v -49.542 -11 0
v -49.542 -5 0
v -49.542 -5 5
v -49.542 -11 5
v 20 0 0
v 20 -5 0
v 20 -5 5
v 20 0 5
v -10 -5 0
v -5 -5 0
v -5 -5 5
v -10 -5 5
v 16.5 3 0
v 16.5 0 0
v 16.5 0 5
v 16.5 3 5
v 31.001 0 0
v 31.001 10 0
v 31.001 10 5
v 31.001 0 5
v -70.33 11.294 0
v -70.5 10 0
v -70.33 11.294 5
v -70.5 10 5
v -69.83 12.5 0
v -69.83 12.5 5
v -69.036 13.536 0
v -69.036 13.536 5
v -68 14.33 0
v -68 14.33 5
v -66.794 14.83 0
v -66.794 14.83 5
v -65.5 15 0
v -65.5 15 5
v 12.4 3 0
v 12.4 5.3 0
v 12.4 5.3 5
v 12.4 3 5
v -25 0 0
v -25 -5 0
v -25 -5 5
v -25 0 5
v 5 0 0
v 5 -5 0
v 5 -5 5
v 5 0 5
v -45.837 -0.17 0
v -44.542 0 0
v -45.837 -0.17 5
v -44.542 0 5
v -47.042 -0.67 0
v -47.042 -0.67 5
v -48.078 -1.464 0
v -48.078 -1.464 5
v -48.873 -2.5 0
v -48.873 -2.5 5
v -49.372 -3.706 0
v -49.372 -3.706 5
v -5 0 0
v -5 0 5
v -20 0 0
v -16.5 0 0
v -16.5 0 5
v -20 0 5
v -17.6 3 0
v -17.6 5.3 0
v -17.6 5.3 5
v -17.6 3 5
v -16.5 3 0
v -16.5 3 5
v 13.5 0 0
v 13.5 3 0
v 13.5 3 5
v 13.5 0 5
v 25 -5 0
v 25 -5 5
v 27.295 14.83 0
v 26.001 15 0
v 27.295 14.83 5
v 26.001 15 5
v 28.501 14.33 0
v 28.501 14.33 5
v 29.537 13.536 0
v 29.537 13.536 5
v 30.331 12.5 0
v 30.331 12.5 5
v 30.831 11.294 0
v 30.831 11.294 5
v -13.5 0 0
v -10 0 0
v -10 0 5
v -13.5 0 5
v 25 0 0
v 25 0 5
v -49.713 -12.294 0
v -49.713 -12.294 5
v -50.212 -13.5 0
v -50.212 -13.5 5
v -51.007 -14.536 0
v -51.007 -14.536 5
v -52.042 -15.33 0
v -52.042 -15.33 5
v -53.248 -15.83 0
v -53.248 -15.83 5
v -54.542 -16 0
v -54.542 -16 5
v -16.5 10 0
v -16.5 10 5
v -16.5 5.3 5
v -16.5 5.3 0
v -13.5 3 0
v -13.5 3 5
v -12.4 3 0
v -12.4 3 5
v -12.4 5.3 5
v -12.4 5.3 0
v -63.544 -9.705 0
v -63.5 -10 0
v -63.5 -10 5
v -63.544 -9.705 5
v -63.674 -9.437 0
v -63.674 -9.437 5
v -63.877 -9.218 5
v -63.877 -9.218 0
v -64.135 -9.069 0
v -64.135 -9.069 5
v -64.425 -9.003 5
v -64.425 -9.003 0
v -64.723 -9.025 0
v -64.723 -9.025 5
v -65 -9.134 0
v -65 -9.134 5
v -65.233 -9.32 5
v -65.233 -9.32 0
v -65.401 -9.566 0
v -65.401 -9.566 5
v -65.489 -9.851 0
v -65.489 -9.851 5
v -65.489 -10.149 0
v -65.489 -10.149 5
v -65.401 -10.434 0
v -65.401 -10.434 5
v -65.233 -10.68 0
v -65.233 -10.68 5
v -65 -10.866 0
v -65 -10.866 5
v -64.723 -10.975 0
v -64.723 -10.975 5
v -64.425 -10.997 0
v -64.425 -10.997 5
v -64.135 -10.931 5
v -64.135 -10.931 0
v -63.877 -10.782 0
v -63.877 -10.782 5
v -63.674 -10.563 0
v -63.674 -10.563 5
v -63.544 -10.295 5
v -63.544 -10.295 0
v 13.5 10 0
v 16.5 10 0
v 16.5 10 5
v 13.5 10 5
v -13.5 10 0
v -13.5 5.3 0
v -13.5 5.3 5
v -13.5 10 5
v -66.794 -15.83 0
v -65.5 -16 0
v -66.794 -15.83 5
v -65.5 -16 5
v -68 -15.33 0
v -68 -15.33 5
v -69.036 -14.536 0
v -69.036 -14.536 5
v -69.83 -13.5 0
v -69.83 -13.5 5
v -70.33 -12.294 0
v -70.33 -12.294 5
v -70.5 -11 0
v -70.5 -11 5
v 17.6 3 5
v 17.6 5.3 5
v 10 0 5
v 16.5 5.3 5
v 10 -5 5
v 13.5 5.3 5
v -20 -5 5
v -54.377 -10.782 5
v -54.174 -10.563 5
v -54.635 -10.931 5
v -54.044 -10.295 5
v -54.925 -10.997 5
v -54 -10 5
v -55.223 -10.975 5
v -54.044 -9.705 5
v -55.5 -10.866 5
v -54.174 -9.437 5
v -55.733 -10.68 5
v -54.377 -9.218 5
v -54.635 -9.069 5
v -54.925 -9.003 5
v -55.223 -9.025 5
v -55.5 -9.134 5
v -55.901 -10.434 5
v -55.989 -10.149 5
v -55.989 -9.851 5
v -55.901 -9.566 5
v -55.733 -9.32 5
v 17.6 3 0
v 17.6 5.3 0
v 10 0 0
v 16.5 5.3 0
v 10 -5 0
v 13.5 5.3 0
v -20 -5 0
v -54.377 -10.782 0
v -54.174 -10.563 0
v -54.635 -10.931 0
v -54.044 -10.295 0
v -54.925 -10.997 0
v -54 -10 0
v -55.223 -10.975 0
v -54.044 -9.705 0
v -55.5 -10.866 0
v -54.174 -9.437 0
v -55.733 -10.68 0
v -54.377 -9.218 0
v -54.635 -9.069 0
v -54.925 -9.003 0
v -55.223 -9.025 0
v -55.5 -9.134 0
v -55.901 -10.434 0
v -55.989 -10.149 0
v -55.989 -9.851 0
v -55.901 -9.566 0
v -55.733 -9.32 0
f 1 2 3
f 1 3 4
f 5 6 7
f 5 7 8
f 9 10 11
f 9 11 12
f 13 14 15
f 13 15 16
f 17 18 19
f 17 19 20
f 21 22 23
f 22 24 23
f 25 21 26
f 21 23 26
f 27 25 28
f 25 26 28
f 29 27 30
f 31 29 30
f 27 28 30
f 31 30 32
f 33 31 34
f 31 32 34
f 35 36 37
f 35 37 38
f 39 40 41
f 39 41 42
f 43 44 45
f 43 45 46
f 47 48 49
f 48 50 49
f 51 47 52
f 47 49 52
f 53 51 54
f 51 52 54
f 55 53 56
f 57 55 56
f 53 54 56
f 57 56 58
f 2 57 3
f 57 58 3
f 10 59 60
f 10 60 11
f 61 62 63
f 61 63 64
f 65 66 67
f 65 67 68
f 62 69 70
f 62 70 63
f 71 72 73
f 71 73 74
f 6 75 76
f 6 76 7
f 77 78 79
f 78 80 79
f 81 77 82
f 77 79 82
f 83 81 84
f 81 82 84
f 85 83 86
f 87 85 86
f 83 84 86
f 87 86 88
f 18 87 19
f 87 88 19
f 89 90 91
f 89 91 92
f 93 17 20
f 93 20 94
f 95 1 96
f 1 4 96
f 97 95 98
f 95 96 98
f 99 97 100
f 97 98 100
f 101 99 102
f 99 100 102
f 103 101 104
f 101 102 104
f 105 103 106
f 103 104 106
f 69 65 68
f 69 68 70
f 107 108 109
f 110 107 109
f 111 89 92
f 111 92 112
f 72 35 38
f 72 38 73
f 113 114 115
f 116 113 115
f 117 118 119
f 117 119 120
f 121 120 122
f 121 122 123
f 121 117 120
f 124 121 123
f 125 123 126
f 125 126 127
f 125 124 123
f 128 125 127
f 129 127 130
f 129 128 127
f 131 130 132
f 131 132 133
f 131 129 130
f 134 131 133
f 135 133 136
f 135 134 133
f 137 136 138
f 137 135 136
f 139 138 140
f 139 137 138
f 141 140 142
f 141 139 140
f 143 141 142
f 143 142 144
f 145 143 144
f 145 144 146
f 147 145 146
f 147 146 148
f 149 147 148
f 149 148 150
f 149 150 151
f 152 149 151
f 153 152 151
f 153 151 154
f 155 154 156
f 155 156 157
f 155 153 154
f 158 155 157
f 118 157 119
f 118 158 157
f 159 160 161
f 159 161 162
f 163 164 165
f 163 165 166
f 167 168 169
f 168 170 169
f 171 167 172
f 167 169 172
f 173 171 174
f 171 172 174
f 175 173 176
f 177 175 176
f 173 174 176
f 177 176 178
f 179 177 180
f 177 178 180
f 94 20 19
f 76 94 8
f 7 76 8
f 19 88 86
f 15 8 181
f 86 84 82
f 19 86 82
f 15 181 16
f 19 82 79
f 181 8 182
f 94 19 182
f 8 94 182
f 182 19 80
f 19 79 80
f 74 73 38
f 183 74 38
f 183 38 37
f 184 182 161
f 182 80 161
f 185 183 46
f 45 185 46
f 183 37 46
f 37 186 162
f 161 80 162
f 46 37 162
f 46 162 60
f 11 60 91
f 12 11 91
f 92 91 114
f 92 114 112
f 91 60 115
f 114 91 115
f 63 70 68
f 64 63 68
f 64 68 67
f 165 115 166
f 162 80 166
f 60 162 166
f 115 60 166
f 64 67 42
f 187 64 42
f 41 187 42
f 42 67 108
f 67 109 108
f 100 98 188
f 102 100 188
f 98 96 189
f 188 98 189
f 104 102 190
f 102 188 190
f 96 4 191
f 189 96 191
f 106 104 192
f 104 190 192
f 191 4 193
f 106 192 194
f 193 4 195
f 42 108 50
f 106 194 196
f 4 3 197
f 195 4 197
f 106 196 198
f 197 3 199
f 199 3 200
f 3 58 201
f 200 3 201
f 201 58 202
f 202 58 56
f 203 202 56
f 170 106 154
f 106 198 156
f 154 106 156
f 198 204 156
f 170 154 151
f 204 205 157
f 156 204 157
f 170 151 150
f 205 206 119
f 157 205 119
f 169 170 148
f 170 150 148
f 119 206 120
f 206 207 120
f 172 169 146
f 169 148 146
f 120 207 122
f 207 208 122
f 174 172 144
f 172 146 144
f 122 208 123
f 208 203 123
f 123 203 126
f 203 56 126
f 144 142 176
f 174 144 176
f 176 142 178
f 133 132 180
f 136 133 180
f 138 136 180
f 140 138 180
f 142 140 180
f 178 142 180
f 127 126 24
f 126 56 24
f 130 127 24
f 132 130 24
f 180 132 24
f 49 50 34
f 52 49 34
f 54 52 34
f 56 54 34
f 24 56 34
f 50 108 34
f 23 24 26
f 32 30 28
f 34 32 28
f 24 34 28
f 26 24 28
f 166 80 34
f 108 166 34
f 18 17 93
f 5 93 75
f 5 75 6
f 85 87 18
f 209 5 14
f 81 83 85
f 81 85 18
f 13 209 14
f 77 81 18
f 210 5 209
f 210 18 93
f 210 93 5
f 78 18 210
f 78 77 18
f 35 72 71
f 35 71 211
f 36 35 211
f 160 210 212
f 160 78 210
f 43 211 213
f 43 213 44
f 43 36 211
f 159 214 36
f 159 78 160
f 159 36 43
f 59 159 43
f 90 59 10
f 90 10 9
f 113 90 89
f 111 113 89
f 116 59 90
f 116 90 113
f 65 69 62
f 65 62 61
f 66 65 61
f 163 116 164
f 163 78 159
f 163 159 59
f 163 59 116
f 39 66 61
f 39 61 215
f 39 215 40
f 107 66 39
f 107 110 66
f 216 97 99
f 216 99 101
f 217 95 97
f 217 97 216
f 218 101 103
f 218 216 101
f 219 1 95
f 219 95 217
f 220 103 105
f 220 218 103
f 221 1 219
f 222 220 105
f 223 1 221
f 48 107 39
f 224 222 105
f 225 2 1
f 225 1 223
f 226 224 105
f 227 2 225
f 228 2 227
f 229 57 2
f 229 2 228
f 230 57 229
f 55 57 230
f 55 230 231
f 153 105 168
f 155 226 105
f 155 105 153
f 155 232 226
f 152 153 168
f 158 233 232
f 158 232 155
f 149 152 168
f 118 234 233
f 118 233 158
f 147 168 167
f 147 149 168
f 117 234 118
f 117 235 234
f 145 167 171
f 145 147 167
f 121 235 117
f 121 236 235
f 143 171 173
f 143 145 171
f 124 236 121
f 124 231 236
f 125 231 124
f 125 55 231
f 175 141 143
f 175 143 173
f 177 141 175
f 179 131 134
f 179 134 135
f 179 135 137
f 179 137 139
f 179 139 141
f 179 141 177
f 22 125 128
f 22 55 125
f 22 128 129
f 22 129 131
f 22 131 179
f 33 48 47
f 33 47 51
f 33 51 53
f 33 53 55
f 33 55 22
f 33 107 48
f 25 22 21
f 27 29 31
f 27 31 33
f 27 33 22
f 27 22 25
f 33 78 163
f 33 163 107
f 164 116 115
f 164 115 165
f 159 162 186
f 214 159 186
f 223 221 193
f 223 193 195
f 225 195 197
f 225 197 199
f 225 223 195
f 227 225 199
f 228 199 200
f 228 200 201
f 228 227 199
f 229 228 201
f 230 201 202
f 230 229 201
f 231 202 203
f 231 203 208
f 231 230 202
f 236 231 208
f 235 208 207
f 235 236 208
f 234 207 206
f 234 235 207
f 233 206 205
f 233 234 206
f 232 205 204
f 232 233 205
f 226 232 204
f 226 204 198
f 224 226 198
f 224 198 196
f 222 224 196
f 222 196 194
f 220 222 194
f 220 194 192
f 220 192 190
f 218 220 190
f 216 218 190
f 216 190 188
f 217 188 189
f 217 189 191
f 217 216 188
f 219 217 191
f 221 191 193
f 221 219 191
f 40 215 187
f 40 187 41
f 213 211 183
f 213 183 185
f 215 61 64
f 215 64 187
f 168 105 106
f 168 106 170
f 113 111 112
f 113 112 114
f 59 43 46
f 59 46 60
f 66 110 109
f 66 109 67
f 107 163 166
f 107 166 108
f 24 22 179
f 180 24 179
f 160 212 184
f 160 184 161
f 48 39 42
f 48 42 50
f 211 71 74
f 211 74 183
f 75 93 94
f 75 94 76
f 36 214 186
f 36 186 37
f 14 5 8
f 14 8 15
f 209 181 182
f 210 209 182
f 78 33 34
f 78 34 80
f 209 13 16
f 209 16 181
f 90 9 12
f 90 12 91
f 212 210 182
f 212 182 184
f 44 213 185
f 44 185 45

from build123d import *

# Parameters (mm, degrees)
ESQUISSE1_R        = 1
BOSS_EXTRU_1_DEPTH = 5
CONG_1_R           = 5


with BuildPart() as part:
    # Esquisse1 → Boss.-Extru.1 (new body)
    with BuildSketch(Plane.XY):
        Polygon((-16.5, 0), (-20, 0), (-20, -5), (-25, -5), (-25, 0), (-49.542451618, 0), (-49.542451618, -16), (-70.5, -16), (-70.5, 0), (-70.5, 15), (31.001104841, 15), (31.001104841, 0), (25, 0), (25, -5), (20, -5), (20, 0), (16.5, 0), (16.5, 3), (17.6, 3), (17.6, 5.3), (16.5, 5.3), (16.5, 10), (13.5, 10), (13.5, 5.3), (12.4, 5.3), (12.4, 3), (13.5, 3), (13.5, 0), (10, 0), (10, -5), (5, -5), (5, 0), (-5, 0), (-5, -5), (-10, -5), (-10, 0), (-13.5, 0), (-13.5, 3), (-12.4, 3), (-12.4, 5.3), (-13.5, 5.3), (-13.5, 10), (-16.5, 10), (-16.5, 5.3), (-17.6, 5.3), (-17.6, 3), (-16.5, 3), align=None)
        with Locations((-64.5, -10)):
            Circle(ESQUISSE1_R, mode=Mode.SUBTRACT)
        with Locations((-55, -10)):
            Circle(ESQUISSE1_R, mode=Mode.SUBTRACT)
    extrude(amount=BOSS_EXTRU_1_DEPTH)

    # Congé1
    cong_1_edges = [part.edges().sort_by_distance(p)[0] for p in [
        (-49.542451618, 0, 2.5),
        (-49.542451618, -16, 2.5),
        (-70.5, -16, 2.5),
        (-70.5, 15, 2.5),
        (31.001104841, 15, 2.5),
    ]]
    fillet(cong_1_edges, radius=CONG_1_R)


solid = part.part
